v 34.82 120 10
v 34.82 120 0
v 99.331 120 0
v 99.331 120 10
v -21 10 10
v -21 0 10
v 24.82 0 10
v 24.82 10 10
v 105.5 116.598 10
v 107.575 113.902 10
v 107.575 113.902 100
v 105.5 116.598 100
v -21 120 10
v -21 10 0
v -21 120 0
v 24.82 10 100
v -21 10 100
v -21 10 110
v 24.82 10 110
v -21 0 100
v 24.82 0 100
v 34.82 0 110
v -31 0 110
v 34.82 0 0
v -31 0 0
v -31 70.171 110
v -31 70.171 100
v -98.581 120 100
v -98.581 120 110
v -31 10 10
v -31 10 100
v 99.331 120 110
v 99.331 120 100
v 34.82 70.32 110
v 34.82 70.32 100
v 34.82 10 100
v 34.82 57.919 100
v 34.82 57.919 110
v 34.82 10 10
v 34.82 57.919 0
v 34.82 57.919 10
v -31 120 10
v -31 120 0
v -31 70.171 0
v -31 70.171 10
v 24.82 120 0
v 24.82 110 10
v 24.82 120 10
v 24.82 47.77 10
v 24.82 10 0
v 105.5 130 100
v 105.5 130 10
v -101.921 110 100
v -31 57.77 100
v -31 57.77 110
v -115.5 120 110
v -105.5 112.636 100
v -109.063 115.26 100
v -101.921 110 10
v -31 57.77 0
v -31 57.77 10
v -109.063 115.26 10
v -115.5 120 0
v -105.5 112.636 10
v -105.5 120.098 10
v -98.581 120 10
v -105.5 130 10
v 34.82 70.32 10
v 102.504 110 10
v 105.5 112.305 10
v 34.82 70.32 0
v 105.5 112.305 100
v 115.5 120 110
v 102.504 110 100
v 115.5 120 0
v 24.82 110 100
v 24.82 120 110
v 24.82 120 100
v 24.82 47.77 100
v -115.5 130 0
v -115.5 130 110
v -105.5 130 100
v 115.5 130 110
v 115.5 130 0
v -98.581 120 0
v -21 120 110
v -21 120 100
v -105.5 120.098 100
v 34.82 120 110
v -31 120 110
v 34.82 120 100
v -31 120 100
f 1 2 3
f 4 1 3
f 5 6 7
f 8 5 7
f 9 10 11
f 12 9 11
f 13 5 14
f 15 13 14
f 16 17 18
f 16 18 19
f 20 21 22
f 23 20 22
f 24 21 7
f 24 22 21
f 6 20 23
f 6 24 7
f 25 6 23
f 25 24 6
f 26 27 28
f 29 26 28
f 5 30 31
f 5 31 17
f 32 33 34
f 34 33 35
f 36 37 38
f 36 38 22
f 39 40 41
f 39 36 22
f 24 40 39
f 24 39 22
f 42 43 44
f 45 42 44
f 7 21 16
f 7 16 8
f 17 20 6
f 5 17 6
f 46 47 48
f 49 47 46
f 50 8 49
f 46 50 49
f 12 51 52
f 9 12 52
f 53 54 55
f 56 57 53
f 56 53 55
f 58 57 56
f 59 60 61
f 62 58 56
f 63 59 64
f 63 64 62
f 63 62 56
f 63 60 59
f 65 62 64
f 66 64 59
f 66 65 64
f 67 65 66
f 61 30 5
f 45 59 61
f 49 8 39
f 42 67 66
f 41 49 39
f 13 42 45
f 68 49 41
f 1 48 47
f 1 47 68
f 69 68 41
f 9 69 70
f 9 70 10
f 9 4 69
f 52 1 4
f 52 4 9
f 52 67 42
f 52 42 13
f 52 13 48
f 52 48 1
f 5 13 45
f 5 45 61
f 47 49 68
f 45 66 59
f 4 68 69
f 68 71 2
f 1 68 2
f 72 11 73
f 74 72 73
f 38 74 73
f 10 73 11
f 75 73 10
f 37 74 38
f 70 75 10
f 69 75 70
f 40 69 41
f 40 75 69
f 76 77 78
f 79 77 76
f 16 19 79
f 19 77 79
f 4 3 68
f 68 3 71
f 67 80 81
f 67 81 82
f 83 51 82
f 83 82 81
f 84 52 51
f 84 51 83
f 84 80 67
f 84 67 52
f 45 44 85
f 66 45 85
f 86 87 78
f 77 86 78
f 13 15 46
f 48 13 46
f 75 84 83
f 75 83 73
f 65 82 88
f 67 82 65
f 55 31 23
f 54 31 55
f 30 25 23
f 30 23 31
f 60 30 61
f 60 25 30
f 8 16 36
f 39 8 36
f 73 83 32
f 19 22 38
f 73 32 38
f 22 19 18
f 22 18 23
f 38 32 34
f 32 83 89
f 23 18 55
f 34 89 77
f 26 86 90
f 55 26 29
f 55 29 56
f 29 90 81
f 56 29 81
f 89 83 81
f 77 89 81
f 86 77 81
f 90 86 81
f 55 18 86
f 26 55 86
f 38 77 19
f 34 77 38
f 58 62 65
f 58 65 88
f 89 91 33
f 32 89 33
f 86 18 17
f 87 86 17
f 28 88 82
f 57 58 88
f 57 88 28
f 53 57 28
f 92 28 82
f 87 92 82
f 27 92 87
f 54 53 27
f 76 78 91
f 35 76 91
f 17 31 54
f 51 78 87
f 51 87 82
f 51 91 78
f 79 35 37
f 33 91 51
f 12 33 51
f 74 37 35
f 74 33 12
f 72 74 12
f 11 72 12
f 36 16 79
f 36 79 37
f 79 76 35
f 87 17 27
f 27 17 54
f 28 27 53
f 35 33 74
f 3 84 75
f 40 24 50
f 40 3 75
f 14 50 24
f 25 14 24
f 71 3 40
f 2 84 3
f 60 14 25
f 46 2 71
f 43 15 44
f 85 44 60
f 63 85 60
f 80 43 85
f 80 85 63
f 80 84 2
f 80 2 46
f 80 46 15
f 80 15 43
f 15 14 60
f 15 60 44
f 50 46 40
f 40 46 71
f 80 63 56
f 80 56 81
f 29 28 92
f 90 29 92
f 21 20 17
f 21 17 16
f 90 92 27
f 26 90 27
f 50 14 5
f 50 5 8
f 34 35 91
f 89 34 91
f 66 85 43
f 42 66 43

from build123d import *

# Parameters (mm, degrees)
SKETCH3_W           = 45.820005247
SKETCH3_H           = 110
EXTRUDE1_DEPTH      = 110
SKETCH5_W           = 90
SKETCH5_H           = 37.77
CUT_EXTRUDE1_DEPTH  = 72
SKETCH6_W           = 45.820005247
SKETCH6_H           = 90
CUT_EXTRUDE3_DEPTH  = 130
SKETCH8_W           = 211
SKETCH8_H           = 90
CUT_EXTRUDE4_DEPTH  = 20
SKETCH9_W           = 91.800610731
SKETCH9_H           = 90
CUT_EXTRUDE6_DEPTH  = 10
SKETCH10_W          = 90
SKETCH10_H          = 72.23
CUT_EXTRUDE9_DEPTH  = 10
SKETCH11_W          = 103.619303527
SKETCH11_H          = 90
CUT_EXTRUDE11_DEPTH = 20
SKETCH12_W          = 90
SKETCH12_H          = 82.03288143
CUT_EXTRUDE13_DEPTH = 20


with BuildPart() as part:
    # Sketch3 → Extrude1 (new body)
    with BuildSketch(Plane.XY):
        Polygon((-115.5, 130), (115.5, 130), (115.5, 120), (34.820005247, 57.918579334), (34.820005247, 0), (-31, 0), (-31, 57.77), (-115.5, 120), align=None)
        Polygon((-31, 120), (-31, 70.171133991), (-98.581267218, 120), align=None, mode=Mode.SUBTRACT)
        Polygon((34.820005247, 70.319713325), (34.820005247, 120), (99.331172327, 120), align=None, mode=Mode.SUBTRACT)
        with Locations((1.910002624, 65)):
            Rectangle(SKETCH3_W, SKETCH3_H, mode=Mode.SUBTRACT)
    extrude(amount=EXTRUDE1_DEPTH)

    # Sketch5 → Cut-Extrude1 (cut)
    with BuildSketch(Plane.ZY.offset(31)):
        with Locations((55, 28.885)):
            Rectangle(SKETCH5_W, SKETCH5_H)
    extrude(amount=-CUT_EXTRUDE1_DEPTH, mode=Mode.SUBTRACT)

    # Sketch6 → Cut-Extrude3 (cut)
    with BuildSketch(Plane(origin=(0, 0, 0), x_dir=(1, 0, 0), z_dir=(0, 1, 0))):
        with Locations((1.910002624, -55)):
            Rectangle(SKETCH6_W, SKETCH6_H)
    extrude(amount=CUT_EXTRUDE3_DEPTH, mode=Mode.SUBTRACT)

    # Sketch8 → Cut-Extrude4 (cut)
    with BuildSketch(Plane(origin=(0, 130, 0), x_dir=(1, 0, 0), z_dir=(0, 1, 0))):
        with Locations((0, -55)):
            Rectangle(SKETCH8_W, SKETCH8_H)
    extrude(amount=-CUT_EXTRUDE4_DEPTH, mode=Mode.SUBTRACT)

    # Sketch9 → Cut-Extrude6 (cut)
    with BuildSketch(Plane(origin=(-15.043239393, 19.549946865, 0), x_dir=(0.792529575, 0.60983348, 0), z_dir=(0.60983348, -0.792529575, 0))):
        with Locations((108.816878092, 55)):
            Rectangle(SKETCH9_W, SKETCH9_H)
    extrude(amount=-CUT_EXTRUDE6_DEPTH, mode=Mode.SUBTRACT)

    # Sketch10 → Cut-Extrude9 (cut)
    with BuildSketch(Plane(origin=(34.820005247, 0, 0), x_dir=(0, 0, -1), z_dir=(1, 0, 0))):
        with Locations((-55, 83.885)):
            Rectangle(SKETCH10_W, SKETCH10_H)
    extrude(amount=-CUT_EXTRUDE9_DEPTH, mode=Mode.SUBTRACT)

    # Sketch11 → Cut-Extrude11 (cut)
    with BuildSketch(Plane(origin=(16.683281999, 22.653661079, 0), x_dir=(0.805206703, -0.592994238, 0), z_dir=(-0.592994238, -0.805206703, 0))):
        with Locations((-104.356929468, 55)):
            Rectangle(SKETCH11_W, SKETCH11_H)
    extrude(amount=-CUT_EXTRUDE11_DEPTH, mode=Mode.SUBTRACT)

    # Sketch12 → Cut-Extrude13 (cut)
    with BuildSketch(Plane.ZY.offset(31)):
        with Locations((55, 88.786440715)):
            Rectangle(SKETCH12_W, SKETCH12_H)
    extrude(amount=-CUT_EXTRUDE13_DEPTH, mode=Mode.SUBTRACT)


solid = part.part
